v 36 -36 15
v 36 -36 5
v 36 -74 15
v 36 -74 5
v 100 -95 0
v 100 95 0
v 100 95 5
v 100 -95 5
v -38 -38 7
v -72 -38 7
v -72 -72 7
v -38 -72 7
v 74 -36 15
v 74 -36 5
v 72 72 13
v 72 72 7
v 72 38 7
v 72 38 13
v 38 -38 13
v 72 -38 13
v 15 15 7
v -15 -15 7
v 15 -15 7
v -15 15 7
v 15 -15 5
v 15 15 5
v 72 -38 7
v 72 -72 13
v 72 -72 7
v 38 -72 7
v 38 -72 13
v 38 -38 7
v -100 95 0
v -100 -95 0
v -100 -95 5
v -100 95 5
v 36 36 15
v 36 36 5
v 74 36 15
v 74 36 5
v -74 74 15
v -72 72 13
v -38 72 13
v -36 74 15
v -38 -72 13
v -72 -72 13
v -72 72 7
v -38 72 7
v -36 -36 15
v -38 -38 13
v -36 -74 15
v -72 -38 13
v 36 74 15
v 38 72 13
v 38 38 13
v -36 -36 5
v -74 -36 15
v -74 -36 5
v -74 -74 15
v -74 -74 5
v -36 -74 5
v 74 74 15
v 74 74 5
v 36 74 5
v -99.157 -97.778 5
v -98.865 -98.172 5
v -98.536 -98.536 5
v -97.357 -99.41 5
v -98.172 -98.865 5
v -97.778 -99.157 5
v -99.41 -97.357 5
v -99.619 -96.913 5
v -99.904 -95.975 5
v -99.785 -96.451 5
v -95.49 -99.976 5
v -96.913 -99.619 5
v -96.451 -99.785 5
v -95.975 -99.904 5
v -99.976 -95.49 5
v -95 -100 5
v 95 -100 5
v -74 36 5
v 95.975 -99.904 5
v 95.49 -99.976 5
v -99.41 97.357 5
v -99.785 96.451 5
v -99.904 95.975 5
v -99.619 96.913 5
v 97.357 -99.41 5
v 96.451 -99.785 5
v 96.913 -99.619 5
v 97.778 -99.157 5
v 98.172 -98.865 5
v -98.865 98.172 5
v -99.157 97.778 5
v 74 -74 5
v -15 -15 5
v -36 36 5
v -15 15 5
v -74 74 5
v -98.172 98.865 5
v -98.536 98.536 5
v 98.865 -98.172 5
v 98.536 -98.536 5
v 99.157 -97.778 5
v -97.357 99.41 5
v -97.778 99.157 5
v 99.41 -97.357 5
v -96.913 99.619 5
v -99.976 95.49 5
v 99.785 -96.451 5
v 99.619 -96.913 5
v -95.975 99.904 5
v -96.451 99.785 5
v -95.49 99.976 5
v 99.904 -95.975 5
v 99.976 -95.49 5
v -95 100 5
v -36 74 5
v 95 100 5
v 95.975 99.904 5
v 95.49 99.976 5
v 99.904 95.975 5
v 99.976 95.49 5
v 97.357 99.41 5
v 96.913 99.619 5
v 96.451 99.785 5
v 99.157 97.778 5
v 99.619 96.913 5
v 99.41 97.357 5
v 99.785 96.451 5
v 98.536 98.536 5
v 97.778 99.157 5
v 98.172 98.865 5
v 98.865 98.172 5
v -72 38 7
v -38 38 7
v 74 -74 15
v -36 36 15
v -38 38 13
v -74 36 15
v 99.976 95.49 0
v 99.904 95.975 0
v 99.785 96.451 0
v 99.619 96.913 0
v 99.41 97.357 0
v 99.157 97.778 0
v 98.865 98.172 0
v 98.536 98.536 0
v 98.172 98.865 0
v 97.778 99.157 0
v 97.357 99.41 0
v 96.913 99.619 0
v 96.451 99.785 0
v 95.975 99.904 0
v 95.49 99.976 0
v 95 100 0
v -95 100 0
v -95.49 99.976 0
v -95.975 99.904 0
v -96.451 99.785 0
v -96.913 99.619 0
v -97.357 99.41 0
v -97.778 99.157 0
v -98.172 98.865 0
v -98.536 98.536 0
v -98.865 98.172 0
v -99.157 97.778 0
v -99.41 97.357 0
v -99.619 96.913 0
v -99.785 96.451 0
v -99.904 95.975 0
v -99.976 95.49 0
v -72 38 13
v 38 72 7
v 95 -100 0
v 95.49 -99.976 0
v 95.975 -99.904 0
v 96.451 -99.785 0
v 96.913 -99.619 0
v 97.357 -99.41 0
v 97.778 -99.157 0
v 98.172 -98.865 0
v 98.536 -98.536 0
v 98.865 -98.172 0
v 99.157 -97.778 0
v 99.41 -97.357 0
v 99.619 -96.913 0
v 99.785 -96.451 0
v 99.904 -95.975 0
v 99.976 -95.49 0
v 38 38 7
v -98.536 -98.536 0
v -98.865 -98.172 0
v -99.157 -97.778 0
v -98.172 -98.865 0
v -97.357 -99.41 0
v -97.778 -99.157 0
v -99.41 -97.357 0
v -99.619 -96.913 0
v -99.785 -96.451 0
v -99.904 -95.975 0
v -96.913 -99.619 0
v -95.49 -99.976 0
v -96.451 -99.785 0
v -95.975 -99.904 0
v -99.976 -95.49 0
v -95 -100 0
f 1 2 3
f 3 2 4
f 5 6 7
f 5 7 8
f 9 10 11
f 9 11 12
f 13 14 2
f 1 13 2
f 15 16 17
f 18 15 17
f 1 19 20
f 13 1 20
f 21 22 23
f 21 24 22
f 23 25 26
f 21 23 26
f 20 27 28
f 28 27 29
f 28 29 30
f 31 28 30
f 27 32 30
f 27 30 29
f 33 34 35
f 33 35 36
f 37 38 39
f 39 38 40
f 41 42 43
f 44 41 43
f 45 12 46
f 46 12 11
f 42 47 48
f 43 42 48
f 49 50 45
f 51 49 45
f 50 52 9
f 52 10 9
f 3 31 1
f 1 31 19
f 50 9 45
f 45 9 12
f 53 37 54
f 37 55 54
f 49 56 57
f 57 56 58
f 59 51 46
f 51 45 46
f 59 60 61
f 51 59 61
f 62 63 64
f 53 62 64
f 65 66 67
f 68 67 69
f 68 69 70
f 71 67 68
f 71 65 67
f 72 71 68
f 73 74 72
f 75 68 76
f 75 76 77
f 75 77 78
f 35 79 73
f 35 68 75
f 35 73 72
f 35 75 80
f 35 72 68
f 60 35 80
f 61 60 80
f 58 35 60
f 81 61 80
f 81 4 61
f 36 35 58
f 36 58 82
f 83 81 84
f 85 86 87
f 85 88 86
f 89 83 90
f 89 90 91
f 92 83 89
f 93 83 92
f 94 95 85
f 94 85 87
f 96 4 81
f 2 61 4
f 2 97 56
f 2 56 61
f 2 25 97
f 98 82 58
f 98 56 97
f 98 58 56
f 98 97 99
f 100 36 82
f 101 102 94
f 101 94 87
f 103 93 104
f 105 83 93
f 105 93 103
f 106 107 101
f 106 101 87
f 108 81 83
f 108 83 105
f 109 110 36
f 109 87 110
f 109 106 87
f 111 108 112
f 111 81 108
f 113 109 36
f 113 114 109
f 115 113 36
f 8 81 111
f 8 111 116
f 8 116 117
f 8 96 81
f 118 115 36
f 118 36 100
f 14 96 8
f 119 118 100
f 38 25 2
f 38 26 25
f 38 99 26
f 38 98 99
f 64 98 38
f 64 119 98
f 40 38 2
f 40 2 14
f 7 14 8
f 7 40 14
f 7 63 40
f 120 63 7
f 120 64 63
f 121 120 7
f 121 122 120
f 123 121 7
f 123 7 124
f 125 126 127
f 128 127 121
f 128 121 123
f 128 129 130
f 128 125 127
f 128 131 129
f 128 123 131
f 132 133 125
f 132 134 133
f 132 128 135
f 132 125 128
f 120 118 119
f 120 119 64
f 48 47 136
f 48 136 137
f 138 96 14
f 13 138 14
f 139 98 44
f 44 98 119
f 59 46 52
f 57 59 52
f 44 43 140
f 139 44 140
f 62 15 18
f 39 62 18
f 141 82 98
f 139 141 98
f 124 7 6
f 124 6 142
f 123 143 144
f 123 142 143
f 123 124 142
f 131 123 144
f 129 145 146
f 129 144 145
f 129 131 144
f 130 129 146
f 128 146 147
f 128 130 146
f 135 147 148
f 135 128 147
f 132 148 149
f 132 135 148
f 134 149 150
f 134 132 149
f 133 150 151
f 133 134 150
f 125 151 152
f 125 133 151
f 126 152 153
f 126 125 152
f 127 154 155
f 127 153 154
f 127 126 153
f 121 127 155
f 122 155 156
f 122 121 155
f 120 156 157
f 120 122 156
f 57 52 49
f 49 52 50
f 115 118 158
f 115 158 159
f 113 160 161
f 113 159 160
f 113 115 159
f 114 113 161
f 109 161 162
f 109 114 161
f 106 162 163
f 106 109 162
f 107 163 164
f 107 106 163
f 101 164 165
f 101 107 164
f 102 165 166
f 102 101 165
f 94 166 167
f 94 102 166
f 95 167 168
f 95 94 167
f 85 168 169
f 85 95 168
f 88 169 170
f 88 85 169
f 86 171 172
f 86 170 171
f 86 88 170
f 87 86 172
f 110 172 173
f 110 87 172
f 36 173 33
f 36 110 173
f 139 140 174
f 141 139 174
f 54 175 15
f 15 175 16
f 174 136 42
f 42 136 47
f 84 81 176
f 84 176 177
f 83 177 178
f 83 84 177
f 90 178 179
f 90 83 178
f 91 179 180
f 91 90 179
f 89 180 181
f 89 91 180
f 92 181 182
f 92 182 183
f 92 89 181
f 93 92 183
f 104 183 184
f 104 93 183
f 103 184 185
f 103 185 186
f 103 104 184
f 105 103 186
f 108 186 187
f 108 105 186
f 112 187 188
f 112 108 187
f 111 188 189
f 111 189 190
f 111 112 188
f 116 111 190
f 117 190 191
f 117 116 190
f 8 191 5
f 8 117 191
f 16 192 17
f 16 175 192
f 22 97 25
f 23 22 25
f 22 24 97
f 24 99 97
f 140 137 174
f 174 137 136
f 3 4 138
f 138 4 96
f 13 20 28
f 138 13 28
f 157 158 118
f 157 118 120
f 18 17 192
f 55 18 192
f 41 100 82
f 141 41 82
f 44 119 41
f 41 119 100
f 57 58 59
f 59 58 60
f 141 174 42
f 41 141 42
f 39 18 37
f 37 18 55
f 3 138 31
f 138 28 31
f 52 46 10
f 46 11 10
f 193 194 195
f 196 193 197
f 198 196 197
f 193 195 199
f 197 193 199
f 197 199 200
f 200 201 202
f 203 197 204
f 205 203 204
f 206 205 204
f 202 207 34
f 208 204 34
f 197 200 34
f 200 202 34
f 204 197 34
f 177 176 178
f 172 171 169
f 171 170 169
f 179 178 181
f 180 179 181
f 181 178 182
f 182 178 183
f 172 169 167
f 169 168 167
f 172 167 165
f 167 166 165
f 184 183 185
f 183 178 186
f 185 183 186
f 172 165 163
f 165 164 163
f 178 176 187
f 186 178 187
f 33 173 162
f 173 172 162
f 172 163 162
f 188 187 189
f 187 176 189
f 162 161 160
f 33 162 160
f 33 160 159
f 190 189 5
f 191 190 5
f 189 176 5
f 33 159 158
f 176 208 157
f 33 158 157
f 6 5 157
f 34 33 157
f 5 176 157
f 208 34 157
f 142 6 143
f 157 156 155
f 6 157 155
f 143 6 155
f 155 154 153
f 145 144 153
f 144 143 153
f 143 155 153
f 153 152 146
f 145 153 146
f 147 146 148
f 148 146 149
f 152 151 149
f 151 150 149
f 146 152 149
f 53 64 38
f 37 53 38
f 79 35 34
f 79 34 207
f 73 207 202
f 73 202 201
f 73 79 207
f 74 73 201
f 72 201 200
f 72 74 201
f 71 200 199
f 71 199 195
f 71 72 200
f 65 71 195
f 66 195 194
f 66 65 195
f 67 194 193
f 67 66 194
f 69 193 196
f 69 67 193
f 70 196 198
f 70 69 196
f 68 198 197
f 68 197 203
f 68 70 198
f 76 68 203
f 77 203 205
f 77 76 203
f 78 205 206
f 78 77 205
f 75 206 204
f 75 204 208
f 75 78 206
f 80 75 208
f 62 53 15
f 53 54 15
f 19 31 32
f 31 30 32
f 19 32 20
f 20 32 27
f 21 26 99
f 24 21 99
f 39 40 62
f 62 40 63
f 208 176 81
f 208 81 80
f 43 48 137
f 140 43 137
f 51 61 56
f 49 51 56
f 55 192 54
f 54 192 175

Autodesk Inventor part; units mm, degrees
ref_plane "YZ Plane" through (0, 0, 0) normal (1, 0, 0) x (0, 1, 0)
ref_plane "XZ Plane" through (0, 0, 0) normal (0, 1, 0) x (-1, 0, 0)
ref_plane "XY Plane" through (0, 0, 0) normal (0, 0, 1) x (1, 0, 0)
sketch "Náčrt1" plane through (0, 0, 0) normal (0, 0, 1) x (1, 0, 0)
  line L0 (-140, 0) -> (140, 0) projected
  line L1 (0, -140) -> (0, 140) projected
  line L2 (-100, 100) -> (100, 100)
  line L3 (100, 100) -> (100, -100)
  line L4 (100, -100) -> (-100, -100)
  line L5 (-100, -100) -> (-100, 100)
  point P0 (0, 0)
  point P1 (0, 100)
  point P2 (100, 0)
  dimension "d0" = 200
  dimension "d1" = 200
extrude "Vysunutí1" add sketch "Náčrt1" along normal blind 5
fillet "Zaoblení1" radius 5 4 edges at (100, 100, 2.5) (-100, 100, 2.5) (-100, -100, 2.5) (100, -100, 2.5)
sketch "Náčrt2" plane through (0, 0, 5) normal (0, 0, 1) x (1, 0, 0)
  line L0 (-100, 95) -> (-100, -95) projected
  line L1 (-95, -100) -> (95, -100) projected
  arc A0 (95, -100) -> (100, -95) centre (95, -95) ccw projected
  line L2 (100, -95) -> (100, 95) projected
  arc A1 (100, 95) -> (95, 100) centre (95, 95) ccw projected
  line L3 (95, 100) -> (-95, 100) projected
  arc A2 (-95, 100) -> (-100, 95) centre (-95, 95) ccw projected
  line L4 (-100, 95) -> (-100, -95) projected
  arc A3 (-100, -95) -> (-95, -100) centre (-95, -95) ccw projected
  line L5 (-95, -100) -> (95, -100) projected
  line L6 (-141.4497, 0) -> (141.4497, 0) projected
  line L7 (0, -141.4497) -> (0, 141.4497) projected
  line L8 (-15, -15) -> (15, -15)
  line L9 (15, -15) -> (15, 15)
  line L10 (15, 15) -> (-15, 15)
  line L11 (-15, 15) -> (-15, -15)
  line L12 (-72, -72) -> (-38, -72)
  line L13 (-38, -72) -> (-38, -38)
  line L14 (-38, -38) -> (-72, -38)
  line L15 (-72, -38) -> (-72, -72)
  line L16 (-72, 38) -> (-38, 38)
  line L17 (-72, 72) -> (-72, 38)
  line L18 (-38, 72) -> (-72, 72)
  line L19 (-38, 38) -> (-38, 72)
  line L20 (38, -72) -> (72, -72)
  line L21 (38, -38) -> (38, -72)
  line L22 (72, -38) -> (38, -38)
  line L23 (72, -72) -> (72, -38)
  line L24 (38, 38) -> (72, 38)
  line L25 (38, 72) -> (38, 38)
  line L26 (72, 72) -> (38, 72)
  line L27 (72, 38) -> (72, 72)
  point P0 (0, 0)
  point P1 (-15, 0)
  point P2 (0, 15)
  dimension "d5" = 30
  dimension "d6" = 30
  dimension "d8" = 34
  dimension "d9" = 34
  dimension "d10" = 28
  dimension "d11" = 28
  dimension "d14" = 110
  dimension "d17" = 110
extrude "Vysunutí2" add sketch "Náčrt2" along normal blind 2 contours L11 L10 L7 L6 | L6 L7 L8 L11 | L7 L10 L9 L6 | L6 L9 L8 L7 | L15 L14 L13 L12 | L17 L18 L19 L16 | L21 L22 L23 L20 | L25 L26 L27 L24
sketch "Náčrt4" plane through (0, 0, 5) normal (0, 0, 1) x (1, 0, 0)
  line L0 (-38, 38) -> (-72, 38) projected
  line L1 (-72, 38) -> (-72, 72) projected
  line L2 (-72, 72) -> (-38, 72) projected
  line L3 (-38, 72) -> (-38, 38) projected
  line L4 (72, 38) -> (38, 38) projected
  line L5 (38, 38) -> (38, 72) projected
  line L6 (38, 72) -> (72, 72) projected
  line L7 (72, 72) -> (72, 38) projected
  line L8 (-15, 15) -> (15, 15) projected
  line L9 (15, 15) -> (15, -15) projected
  line L10 (15, -15) -> (-15, -15) projected
  line L11 (-15, -15) -> (-15, 15) projected
  line L12 (72, -72) -> (38, -72) projected
  line L13 (38, -72) -> (38, -38) projected
  line L14 (38, -38) -> (72, -38) projected
  line L15 (72, -38) -> (72, -72) projected
  line L16 (-38, -38) -> (-38, -72) projected
  line L17 (-38, -72) -> (-72, -72) projected
  line L18 (-72, -72) -> (-72, -38) projected
  line L19 (-72, -38) -> (-38, -38) projected
  arc A0 (95, -100) -> (100, -95) centre (95, -95) ccw projected
  line L20 (100, -95) -> (100, 95) projected
  arc A1 (100, 95) -> (95, 100) centre (95, 95) ccw projected
  line L21 (95, 100) -> (-95, 100) projected
  arc A2 (-95, 100) -> (-100, 95) centre (-95, 95) ccw projected
  line L22 (-100, 95) -> (-100, -95) projected
  arc A3 (-100, -95) -> (-95, -100) centre (-95, -95) ccw projected
  line L23 (-95, -100) -> (95, -100) projected
  line L24 (-38, -38) -> (-72, -38) projected
  line L25 (-72, -38) -> (-72, -72) projected
  line L26 (-72, -72) -> (-38, -72) projected
  line L27 (-38, -72) -> (-38, -38) projected
  line L28 (-15, 15) -> (-15, -15) projected
  line L29 (-15, -15) -> (15, -15) projected
  line L30 (15, -15) -> (15, 15) projected
  line L31 (15, 15) -> (-15, 15) projected
  line L32 (-38, 72) -> (-72, 72) projected
  line L33 (-38, 38) -> (-38, 72) projected
  line L34 (-38, 72) -> (-72, 72) projected
  line L35 (-72, 72) -> (-72, 38) projected
  line L36 (-72, 38) -> (-38, 38) projected
  line L37 (72, 38) -> (72, 72) projected
  line L38 (72, 72) -> (38, 72) projected
  line L39 (38, 72) -> (38, 38) projected
  line L40 (38, 38) -> (72, 38) projected
  line L41 (72, -72) -> (72, -38) projected
  line L42 (72, -38) -> (38, -38) projected
  line L43 (38, -38) -> (38, -72) projected
  line L44 (38, -72) -> (72, -72) projected
  line L45 (0, -141.4497) -> (0, 141.4497) projected
  line L46 (-141.4497, 0) -> (141.4497, 0) projected
  line L47 (-74, -74) -> (-36, -74)
  line L48 (-36, -74) -> (-36, -36)
  line L49 (-36, -36) -> (-74, -36)
  line L50 (-74, -36) -> (-74, -74)
  line L51 (-36, 36) -> (-36, 74)
  line L52 (-74, 36) -> (-36, 36)
  line L53 (-36, 74) -> (-74, 74)
  line L54 (-74, 74) -> (-74, 36)
  line L55 (74, -74) -> (74, -36)
  line L56 (36, -74) -> (74, -74)
  line L57 (74, -36) -> (36, -36)
  line L58 (36, -36) -> (36, -74)
  line L59 (74, 36) -> (74, 74)
  line L60 (36, 36) -> (74, 36)
  line L61 (74, 74) -> (36, 74)
  line L62 (36, 74) -> (36, 36)
  point P0 (0, 0)
  dimension "d22" = 38
  dimension "d23" = 38
  dimension "d24" = 2
  dimension "d25" = 2
  dimension "d28" = 110
  dimension "d31" = 110
extrude "Vysunutí3" add sketch "Náčrt4" along normal blind 10 contours L50 L49 L48 L47 | L52 L54 L53 L51 | L56 L58 L57 L55 | L60 L62 L61 L59
chamfer "Zkosení1" distance 2 angle 45 16 edges at (-55, -72, 15) (-72, -55, 15) (-55, -38, 15) (-38, -55, 15) (-55, 38, 15) (-72, 55, 15) (-55, 72, 15) (-38, 55, 15) (38, -55, 15) (55, -38, 15) (55, -72, 15) (72, -55, 15) (55, 38, 15) (38, 55, 15) (55, 72, 15) (72, 55, 15)
properties part number "testovaci_podlozka"
